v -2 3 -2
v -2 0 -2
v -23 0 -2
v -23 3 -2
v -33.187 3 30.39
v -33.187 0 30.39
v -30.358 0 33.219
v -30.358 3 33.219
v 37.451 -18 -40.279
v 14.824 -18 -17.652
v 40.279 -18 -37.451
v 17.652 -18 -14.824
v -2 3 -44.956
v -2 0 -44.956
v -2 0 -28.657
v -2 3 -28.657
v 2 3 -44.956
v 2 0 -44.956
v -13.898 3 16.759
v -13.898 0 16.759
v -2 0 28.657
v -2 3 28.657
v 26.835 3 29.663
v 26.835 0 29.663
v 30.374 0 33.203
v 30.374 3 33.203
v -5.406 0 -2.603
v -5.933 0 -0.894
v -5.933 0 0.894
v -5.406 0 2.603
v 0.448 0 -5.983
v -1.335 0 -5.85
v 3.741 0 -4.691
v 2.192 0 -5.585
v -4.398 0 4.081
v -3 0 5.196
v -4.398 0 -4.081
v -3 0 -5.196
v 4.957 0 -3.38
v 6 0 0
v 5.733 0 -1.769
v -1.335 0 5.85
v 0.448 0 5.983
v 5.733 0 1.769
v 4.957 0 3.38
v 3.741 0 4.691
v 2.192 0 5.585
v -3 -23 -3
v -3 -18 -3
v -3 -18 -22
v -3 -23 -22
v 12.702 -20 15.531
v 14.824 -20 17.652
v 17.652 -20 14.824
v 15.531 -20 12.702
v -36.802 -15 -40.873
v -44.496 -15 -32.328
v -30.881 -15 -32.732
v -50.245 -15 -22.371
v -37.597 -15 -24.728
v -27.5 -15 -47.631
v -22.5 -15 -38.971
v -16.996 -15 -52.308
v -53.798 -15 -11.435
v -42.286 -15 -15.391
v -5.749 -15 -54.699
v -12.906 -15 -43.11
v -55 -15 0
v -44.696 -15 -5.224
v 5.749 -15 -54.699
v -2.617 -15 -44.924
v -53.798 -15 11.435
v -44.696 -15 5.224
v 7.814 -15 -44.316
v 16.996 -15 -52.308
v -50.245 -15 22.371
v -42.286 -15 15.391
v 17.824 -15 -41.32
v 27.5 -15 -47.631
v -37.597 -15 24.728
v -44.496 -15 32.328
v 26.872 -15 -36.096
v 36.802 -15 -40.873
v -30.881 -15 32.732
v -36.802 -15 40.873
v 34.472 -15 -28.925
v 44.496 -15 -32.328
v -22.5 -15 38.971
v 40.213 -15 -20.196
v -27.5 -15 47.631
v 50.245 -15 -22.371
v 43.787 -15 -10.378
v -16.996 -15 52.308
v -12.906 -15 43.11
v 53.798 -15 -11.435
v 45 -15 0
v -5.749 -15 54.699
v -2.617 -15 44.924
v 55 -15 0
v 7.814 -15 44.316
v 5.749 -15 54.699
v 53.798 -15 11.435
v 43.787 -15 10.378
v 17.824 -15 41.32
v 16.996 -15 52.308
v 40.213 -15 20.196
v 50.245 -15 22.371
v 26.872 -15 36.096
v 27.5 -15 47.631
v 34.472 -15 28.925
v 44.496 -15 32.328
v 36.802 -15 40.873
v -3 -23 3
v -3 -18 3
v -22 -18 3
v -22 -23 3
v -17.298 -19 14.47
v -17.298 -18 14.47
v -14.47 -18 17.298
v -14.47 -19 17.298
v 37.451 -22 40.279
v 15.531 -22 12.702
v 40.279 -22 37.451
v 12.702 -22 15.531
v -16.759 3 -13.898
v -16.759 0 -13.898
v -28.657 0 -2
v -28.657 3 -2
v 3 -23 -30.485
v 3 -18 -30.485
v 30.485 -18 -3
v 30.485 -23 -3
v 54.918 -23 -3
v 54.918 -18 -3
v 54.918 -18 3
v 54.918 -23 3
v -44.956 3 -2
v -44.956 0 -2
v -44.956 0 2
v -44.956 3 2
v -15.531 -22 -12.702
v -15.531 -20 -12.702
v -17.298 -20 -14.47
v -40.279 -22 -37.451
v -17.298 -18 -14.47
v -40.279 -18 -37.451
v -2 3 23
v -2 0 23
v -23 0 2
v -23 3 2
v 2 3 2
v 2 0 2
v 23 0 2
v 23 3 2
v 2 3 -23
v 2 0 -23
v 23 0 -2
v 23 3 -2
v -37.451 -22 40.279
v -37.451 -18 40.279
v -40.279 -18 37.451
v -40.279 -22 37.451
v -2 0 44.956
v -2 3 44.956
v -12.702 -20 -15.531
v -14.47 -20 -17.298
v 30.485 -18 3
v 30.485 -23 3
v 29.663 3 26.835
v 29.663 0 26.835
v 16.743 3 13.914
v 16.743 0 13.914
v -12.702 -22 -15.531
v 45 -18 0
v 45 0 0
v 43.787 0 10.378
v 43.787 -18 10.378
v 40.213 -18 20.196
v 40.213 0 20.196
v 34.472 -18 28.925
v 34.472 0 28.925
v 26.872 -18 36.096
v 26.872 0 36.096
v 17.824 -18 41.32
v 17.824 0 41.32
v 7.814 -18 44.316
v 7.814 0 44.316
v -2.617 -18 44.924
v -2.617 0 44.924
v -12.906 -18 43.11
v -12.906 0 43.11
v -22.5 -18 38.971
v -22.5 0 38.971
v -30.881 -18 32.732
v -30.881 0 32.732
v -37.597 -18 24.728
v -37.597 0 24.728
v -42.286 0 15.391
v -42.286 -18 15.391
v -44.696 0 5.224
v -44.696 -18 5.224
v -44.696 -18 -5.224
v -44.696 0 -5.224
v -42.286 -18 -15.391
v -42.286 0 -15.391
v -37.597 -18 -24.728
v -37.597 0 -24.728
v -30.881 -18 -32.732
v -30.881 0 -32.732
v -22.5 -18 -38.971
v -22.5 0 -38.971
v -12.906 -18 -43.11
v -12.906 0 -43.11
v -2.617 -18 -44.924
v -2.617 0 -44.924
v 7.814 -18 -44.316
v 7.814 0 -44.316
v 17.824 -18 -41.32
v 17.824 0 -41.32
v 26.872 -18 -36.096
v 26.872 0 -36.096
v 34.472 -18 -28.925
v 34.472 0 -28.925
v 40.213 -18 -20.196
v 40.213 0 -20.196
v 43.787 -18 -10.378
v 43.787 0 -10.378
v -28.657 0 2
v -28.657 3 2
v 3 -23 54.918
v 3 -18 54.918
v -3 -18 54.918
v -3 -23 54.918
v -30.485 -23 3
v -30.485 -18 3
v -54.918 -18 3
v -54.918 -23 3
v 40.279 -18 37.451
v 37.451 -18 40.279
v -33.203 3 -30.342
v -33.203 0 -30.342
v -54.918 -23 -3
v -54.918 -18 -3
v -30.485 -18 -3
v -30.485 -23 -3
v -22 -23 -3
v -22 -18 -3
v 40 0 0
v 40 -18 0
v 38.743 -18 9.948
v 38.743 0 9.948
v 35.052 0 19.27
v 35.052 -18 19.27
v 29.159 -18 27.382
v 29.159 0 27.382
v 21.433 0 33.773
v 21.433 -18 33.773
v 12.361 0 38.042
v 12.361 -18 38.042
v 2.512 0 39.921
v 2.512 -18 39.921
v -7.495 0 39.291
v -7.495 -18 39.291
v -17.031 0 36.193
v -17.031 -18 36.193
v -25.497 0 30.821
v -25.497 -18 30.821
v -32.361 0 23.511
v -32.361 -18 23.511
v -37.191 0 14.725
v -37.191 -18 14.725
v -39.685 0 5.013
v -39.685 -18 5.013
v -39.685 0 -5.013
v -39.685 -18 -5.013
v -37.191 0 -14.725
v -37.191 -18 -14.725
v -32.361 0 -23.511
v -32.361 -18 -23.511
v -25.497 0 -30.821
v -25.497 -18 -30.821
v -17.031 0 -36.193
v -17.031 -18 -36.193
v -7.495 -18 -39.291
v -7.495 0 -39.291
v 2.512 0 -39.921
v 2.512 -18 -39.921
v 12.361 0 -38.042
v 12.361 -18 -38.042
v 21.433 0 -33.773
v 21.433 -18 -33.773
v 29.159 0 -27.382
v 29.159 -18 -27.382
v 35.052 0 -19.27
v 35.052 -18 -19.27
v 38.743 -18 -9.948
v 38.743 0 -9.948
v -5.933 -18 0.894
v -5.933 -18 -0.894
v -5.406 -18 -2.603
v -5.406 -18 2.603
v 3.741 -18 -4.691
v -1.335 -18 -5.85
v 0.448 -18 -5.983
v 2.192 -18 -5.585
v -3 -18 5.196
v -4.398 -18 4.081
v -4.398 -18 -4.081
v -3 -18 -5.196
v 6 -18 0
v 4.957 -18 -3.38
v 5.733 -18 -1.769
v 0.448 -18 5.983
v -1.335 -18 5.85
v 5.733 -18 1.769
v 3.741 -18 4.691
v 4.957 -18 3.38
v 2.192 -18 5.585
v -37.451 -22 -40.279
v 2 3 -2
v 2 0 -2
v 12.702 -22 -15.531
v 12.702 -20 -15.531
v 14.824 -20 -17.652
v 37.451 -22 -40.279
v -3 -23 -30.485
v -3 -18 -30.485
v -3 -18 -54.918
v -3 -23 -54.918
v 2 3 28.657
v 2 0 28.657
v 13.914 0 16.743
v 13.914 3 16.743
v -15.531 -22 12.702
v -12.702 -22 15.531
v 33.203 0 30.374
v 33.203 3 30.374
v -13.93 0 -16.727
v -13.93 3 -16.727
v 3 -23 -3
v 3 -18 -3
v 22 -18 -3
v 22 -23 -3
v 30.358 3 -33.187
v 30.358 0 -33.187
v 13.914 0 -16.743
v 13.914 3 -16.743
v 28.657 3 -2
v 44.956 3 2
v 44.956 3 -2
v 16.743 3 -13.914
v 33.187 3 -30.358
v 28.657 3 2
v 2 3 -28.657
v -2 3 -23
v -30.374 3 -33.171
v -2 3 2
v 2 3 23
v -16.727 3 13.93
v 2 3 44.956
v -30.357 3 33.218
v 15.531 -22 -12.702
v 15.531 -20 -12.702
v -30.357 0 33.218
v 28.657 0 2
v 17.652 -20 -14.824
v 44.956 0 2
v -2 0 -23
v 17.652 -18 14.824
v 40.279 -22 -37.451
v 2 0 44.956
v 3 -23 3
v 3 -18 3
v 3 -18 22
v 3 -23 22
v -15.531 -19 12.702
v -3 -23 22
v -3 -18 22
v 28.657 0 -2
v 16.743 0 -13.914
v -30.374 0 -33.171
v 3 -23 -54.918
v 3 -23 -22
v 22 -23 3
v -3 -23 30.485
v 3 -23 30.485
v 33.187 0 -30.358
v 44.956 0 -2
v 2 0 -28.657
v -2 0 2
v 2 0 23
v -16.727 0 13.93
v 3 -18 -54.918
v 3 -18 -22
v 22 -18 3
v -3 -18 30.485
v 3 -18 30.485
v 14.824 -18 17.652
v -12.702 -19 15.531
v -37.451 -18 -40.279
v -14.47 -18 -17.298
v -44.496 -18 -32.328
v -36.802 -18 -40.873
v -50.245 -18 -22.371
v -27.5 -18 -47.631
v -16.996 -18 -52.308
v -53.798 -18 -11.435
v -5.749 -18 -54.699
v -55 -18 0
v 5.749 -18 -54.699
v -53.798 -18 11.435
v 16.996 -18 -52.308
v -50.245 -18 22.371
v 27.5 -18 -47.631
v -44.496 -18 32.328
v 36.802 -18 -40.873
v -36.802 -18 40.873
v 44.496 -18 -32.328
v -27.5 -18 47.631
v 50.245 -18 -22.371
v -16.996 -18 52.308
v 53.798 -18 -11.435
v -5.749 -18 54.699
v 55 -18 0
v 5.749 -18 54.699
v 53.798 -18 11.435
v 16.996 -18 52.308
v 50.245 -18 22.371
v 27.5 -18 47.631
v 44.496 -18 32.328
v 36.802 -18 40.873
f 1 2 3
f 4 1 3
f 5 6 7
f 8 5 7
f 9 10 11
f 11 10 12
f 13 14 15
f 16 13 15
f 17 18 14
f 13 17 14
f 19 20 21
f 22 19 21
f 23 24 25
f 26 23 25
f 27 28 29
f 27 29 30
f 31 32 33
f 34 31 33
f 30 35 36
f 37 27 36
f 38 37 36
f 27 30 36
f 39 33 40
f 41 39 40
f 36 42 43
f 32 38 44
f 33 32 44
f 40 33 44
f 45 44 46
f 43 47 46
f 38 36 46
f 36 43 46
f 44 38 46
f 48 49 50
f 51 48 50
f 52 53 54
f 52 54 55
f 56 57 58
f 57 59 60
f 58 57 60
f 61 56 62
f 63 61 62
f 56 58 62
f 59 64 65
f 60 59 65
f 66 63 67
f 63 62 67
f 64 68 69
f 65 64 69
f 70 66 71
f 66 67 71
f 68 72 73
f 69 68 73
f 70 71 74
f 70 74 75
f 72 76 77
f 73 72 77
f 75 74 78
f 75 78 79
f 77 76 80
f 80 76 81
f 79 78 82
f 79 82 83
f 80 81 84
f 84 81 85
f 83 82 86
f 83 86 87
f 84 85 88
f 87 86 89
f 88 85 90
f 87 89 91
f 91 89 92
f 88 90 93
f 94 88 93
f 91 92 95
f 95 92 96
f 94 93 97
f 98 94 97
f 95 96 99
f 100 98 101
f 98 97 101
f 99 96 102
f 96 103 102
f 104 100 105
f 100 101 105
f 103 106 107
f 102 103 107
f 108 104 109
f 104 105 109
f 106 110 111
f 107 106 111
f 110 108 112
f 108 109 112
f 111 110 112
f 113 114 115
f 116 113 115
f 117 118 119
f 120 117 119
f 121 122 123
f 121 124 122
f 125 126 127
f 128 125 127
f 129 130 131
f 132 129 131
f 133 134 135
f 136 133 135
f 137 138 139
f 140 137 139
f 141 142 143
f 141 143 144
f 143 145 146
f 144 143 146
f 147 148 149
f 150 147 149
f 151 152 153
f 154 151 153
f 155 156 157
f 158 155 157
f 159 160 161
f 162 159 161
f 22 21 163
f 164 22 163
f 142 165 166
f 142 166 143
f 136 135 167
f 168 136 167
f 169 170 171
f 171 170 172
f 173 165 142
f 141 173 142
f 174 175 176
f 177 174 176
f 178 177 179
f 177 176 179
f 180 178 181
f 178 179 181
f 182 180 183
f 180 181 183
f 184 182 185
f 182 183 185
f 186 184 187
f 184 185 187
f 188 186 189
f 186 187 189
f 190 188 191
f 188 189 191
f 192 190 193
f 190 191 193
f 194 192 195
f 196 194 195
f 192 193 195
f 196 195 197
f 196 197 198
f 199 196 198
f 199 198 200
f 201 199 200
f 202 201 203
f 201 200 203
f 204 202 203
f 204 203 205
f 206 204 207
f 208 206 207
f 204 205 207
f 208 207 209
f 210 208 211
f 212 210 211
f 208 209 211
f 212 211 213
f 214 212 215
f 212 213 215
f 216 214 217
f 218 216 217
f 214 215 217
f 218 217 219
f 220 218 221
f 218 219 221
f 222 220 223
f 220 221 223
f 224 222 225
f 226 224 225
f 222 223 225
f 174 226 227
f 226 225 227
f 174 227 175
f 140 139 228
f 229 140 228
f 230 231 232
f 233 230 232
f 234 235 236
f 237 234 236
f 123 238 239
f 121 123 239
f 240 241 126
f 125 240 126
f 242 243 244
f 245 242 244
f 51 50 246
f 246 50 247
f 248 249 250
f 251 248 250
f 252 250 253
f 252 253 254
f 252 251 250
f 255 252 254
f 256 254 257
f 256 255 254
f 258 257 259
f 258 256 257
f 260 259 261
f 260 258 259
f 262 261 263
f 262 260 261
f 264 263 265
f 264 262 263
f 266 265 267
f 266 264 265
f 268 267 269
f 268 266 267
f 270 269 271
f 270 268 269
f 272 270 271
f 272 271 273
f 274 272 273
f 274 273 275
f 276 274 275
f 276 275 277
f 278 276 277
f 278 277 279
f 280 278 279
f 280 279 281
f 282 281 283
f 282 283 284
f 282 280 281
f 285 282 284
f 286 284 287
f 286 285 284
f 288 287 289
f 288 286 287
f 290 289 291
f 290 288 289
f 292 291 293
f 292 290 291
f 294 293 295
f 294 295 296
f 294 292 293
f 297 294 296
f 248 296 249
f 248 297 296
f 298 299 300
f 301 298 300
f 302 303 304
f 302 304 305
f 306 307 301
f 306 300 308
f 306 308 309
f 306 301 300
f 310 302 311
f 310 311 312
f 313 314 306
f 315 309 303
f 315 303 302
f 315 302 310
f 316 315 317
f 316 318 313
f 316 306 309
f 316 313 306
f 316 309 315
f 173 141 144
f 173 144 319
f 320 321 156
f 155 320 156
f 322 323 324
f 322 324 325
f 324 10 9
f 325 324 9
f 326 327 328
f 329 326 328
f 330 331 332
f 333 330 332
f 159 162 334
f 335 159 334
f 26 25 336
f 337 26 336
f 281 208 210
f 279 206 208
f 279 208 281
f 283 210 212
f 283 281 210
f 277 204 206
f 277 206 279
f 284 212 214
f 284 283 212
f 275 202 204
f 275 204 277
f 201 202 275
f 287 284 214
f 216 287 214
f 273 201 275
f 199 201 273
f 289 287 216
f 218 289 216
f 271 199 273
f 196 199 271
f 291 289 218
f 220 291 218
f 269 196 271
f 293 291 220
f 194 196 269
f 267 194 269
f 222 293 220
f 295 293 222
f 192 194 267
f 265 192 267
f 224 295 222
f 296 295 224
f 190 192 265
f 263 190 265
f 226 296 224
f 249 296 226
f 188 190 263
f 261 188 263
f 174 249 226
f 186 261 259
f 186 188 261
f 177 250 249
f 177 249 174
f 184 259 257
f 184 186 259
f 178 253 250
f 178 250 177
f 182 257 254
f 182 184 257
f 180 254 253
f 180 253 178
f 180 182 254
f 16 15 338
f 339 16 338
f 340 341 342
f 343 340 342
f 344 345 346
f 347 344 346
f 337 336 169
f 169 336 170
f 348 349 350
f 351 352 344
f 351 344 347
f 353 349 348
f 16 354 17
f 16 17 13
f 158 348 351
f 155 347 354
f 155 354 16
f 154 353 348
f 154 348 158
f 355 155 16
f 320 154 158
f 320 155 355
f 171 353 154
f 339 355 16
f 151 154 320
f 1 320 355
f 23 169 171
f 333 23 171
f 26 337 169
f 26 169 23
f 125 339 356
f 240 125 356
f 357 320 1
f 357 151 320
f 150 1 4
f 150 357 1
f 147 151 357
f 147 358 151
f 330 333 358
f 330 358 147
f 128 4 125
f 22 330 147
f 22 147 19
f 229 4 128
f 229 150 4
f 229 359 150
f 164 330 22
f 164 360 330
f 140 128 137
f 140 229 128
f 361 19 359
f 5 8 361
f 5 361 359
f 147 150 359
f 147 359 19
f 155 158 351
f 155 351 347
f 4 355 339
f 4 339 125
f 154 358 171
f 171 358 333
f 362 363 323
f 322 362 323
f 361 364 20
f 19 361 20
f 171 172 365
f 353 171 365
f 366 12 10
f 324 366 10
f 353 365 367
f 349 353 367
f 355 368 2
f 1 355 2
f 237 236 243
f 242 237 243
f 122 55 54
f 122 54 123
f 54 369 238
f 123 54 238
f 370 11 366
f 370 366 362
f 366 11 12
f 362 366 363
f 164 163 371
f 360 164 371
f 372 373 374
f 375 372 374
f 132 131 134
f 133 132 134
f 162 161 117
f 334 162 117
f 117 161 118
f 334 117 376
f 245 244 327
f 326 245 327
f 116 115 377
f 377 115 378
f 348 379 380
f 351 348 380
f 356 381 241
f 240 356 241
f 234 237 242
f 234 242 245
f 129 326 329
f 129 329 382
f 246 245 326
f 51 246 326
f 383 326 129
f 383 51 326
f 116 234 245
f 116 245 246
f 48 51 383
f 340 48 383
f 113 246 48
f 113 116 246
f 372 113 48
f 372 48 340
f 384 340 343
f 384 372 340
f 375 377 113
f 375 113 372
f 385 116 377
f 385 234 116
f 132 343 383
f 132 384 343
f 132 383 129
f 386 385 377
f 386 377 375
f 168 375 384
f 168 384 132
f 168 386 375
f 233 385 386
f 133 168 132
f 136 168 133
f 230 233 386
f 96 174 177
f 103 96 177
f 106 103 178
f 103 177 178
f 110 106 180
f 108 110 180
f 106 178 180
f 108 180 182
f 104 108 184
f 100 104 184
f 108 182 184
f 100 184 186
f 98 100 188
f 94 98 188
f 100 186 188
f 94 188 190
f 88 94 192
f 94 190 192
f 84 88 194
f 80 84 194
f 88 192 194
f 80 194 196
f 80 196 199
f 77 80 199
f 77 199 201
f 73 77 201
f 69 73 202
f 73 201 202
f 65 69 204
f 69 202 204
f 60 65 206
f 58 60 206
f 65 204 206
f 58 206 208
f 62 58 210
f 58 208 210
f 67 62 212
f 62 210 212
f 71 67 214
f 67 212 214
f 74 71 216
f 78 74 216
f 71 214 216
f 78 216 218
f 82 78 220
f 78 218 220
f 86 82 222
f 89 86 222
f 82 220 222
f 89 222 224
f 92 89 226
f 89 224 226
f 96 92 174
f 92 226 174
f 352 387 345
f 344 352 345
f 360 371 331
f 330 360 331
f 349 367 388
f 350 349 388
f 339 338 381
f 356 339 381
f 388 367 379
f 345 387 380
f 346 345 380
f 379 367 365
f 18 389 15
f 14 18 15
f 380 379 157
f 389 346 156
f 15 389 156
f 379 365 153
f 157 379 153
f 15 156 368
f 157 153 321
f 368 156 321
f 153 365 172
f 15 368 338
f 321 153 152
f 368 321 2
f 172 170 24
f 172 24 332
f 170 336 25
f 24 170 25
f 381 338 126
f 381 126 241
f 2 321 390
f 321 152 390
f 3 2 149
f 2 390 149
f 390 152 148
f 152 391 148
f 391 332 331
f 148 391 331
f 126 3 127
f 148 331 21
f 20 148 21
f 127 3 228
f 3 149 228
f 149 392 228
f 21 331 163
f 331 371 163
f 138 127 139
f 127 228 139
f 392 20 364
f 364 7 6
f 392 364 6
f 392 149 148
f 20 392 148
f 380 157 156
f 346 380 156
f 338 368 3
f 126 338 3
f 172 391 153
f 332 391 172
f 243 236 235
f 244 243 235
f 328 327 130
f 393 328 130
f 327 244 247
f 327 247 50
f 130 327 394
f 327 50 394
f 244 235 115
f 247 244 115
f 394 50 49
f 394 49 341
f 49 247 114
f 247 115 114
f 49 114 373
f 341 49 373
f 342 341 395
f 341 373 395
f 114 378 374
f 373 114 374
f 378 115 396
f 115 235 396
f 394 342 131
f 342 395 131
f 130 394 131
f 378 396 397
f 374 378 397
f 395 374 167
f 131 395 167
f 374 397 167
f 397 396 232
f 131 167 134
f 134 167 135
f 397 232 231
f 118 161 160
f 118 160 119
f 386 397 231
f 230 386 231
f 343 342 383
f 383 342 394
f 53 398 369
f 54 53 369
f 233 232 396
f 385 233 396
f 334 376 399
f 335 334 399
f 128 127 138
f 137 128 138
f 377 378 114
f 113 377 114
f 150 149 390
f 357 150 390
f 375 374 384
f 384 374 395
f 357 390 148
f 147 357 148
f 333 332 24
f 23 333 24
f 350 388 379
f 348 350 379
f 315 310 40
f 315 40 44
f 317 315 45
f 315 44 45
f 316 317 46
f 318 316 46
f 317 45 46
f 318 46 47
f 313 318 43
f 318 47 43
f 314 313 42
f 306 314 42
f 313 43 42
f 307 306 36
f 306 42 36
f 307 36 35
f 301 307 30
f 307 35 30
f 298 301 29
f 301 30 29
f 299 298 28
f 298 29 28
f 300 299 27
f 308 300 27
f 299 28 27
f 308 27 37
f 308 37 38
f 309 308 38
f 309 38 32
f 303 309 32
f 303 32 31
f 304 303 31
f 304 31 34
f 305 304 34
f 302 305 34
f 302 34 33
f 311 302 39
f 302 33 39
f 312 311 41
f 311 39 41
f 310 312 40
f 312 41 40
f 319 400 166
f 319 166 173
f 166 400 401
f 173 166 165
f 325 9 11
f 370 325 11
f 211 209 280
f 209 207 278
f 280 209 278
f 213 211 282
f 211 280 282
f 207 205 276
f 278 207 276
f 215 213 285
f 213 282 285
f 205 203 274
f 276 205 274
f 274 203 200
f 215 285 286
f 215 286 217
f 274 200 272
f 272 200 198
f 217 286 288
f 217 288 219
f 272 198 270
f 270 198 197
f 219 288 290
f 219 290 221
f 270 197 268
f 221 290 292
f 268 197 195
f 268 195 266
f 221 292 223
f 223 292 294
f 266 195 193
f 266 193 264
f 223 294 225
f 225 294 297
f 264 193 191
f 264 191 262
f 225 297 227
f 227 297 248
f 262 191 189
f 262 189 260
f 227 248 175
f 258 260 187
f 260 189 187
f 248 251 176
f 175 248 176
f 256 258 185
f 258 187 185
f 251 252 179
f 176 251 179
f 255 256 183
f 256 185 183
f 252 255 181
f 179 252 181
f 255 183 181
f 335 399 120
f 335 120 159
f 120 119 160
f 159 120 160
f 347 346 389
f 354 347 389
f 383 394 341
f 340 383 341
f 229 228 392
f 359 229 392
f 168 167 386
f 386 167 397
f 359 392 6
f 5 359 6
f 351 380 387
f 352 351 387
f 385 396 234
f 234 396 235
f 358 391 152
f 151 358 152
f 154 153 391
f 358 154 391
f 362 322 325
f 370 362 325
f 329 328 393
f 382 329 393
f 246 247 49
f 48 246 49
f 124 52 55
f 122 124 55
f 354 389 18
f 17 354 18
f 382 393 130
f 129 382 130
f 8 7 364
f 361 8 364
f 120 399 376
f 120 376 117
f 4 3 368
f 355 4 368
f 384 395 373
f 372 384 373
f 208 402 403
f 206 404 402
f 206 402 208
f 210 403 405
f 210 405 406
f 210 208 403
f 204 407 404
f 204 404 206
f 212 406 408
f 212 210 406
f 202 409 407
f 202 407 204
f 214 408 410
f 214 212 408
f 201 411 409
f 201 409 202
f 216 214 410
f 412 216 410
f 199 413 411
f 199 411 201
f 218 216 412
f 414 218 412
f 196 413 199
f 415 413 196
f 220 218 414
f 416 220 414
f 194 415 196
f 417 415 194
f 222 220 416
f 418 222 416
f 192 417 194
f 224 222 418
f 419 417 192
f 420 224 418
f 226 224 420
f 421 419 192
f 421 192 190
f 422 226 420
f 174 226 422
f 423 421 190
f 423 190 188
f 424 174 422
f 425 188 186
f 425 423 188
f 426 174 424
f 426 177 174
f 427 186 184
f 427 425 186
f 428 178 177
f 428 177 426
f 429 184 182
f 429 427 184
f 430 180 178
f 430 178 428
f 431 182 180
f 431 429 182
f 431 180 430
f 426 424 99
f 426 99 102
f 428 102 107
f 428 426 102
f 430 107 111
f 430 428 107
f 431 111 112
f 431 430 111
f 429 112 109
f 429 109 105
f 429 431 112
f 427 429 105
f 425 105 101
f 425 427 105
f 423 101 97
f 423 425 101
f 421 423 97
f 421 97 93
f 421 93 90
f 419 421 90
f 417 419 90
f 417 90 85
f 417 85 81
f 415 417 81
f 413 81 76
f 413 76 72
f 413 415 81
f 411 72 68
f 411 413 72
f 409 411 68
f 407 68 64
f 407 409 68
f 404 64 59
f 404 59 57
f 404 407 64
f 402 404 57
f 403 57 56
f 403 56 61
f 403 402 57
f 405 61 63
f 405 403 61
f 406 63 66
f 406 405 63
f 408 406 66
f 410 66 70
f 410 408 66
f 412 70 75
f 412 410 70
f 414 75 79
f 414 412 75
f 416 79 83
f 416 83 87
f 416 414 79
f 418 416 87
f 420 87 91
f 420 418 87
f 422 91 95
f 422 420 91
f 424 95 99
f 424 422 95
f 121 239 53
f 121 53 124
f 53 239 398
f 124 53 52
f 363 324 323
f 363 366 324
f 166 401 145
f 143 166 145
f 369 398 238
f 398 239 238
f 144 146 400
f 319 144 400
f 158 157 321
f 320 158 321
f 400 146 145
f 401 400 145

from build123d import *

# Parameters (mm, degrees)
F0_R      = 6
F1_DEPTH  = 18
F0_R_2    = 45
F0_R_3    = 40
F2_R      = 55
F2_R_2    = 45
F3_DEPTH  = 3
F4_W      = 6
F4_H      = 6
F5_DEPTH  = 5
F7_DEPTH  = 4
F9_DEPTH  = 1
F11_DEPTH = 2
F13_DEPTH = 2
F15_DEPTH = 2
F16_W     = 4
F16_H     = 4
F17_DEPTH = 3


with BuildPart() as f1:
    # F0 (on Front) → F1 (new body)
    with BuildSketch(Plane.XZ):
        Circle(F0_R)
    extrude(amount=F1_DEPTH)


with BuildPart() as f1b:
    # F0 (on Front) → F1, piece 2 (new body)
    with BuildSketch(Plane.XZ):
        Circle(F0_R_2)
        Circle(F0_R_3, mode=Mode.SUBTRACT)
    extrude(amount=F1_DEPTH)


with BuildPart() as f3:
    # F2 (on face) → F3 (new body)
    with BuildSketch(Plane.XZ.offset(18)):
        Circle(F2_R)
        Circle(F2_R_2, mode=Mode.SUBTRACT)
    extrude(amount=-F3_DEPTH)


with BuildPart() as f5:
    # F4 (on face) → F5 (new body)
    with BuildSketch(Plane.XZ.offset(18)):
        Rectangle(F4_W, F4_H)
        with BuildLine():
            Line((-54.918120871, 3), (-54.918120871, -3))
            Line((-54.918120871, -3), (-44.8998886413, -3))
            ThreePointArc((-44.8998886413, -3), (-45, 0), (-44.8998886413, 3))
            Line((-44.8998886413, 3), (-54.918120871, 3))
        make_face()
        Polygon((-25, 0), (-22, -3), (-3, -3), (-3, 3), (-22, 3), align=None)
        Polygon((3, -3), (-3, -3), (-3, -22), (0, -25), (3, -22), align=None)
        Polygon((3, 3), (3, -3), (22, -3), (25, 0), (22, 3), align=None)
        with BuildLine():
            Line((44.8998886413, -3), (54.918120871, -3))
            Line((54.918120871, -3), (54.918120871, 3))
            Line((54.918120871, 3), (44.8998886413, 3))
            ThreePointArc((44.8998886413, 3), (44.9749651965, 1.500834958), (45, 0))
            ThreePointArc((45, 0), (44.9749651965, -1.500834958), (44.8998886413, -3))
        make_face()
        with BuildLine():
            Line((3, 54.918120871), (-3, 54.918120871))
            Line((-3, 54.918120871), (-3, 44.8998886413))
            ThreePointArc((-3, 44.8998886413), (0, 45), (3, 44.8998886413))
            Line((3, 44.8998886413), (3, 54.918120871))
        make_face()
        with BuildLine():
            Line((-3, -44.8998886413), (-3, -54.918120871))
            Line((-3, -54.918120871), (3, -54.918120871))
            Line((3, -54.918120871), (3, -44.8998886413))
            ThreePointArc((3, -44.8998886413), (0, -45), (-3, -44.8998886413))
        make_face()
        Polygon((-3, 22), (-3, 3), (3, 3), (3, 22), (0, 25), align=None)
        with BuildLine():
            ThreePointArc((-44.8998886413, 3), (-45, 0), (-44.8998886413, -3))
            Line((-44.8998886413, -3), (-30.4852813742, -3))
            Line((-30.4852813742, -3), (-33.4852813742, 0))
            Line((-33.4852813742, 0), (-30.4852813742, 3))
            Line((-30.4852813742, 3), (-44.8998886413, 3))
        make_face()
        Polygon((-33.4852813742, 0), (-30.4852813742, -3), (-22, -3), (-25, 0), (-22, 3), (-30.4852813742, 3), align=None)
        Polygon((-3, 30.4852813742), (-30.4852813742, 3), (-22, 3), (-3, 22), align=None)
        Polygon((-22, -3), (-30.4852813742, -3), (-3, -30.4852813742), (-3, -22), align=None)
        Polygon((3, -22), (3, -30.4852813742), (30.4852813742, -3), (22, -3), align=None)
        Polygon((-3, -22), (-3, -30.4852813742), (0, -33.4852813742), (3, -30.4852813742), (3, -22), (0, -25), align=None)
        with BuildLine():
            Line((-3, -30.4852813742), (-3, -44.8998886413))
            ThreePointArc((-3, -44.8998886413), (0, -45), (3, -44.8998886413))
            Line((3, -44.8998886413), (3, -30.4852813742))
            Line((3, -30.4852813742), (0, -33.4852813742))
            Line((0, -33.4852813742), (-3, -30.4852813742))
        make_face()
        Polygon((30.4852813742, 3), (3, 30.4852813742), (3, 22), (22, 3), align=None)
        Polygon((22, -3), (30.4852813742, -3), (33.4852813742, 0), (30.4852813742, 3), (22, 3), (25, 0), align=None)
        Polygon((0, 33.4852813742), (-3, 30.4852813742), (-3, 22), (0, 25), (3, 22), (3, 30.4852813742), align=None)
        with BuildLine():
            ThreePointArc((3, 44.8998886413), (0, 45), (-3, 44.8998886413))
            Line((-3, 44.8998886413), (-3, 30.4852813742))
            Line((-3, 30.4852813742), (0, 33.4852813742))
            Line((0, 33.4852813742), (3, 30.4852813742))
            Line((3, 30.4852813742), (3, 44.8998886413))
        make_face()
        with BuildLine():
            Line((30.4852813742, -3), (44.8998886413, -3))
            ThreePointArc((44.8998886413, -3), (44.9749651965, -1.500834958), (45, 0))
            ThreePointArc((45, 0), (44.9749651965, 1.500834958), (44.8998886413, 3))
            Line((44.8998886413, 3), (30.4852813742, 3))
            Line((30.4852813742, 3), (33.4852813742, 0))
            Line((33.4852813742, 0), (30.4852813742, -3))
        make_face()
    extrude(amount=F5_DEPTH)


with BuildPart() as f7:
    # F6 (on face) → F7 (new body)
    with BuildSketch(Plane.XZ.offset(18)):
        Polygon((-40.279365048, 37.4509379232), (-15.5306277065, 12.7022005817), (-12.7022005817, 15.5306277065), (-37.4509379232, 40.279365048), align=None)
    extrude(amount=F7_DEPTH)

    # F8 (on face) → F9 (cut)
    with BuildSketch(Plane(origin=(0, -18, 0), x_dir=(-1, 0, 0), z_dir=(0, 1, 0))):
        Polygon((17.2983946594, 14.4699675347), (14.4699675347, 17.2983946594), (12.7022005817, 15.5306277065), (15.5306277065, 12.7022005817), align=None)
    extrude(amount=-F9_DEPTH, mode=Mode.SUBTRACT)


with BuildPart() as f7b:
    # F6 (on face) → F7, piece 2 (new body)
    with BuildSketch(Plane.XZ.offset(18)):
        Polygon((-15.5306277065, -12.7022005817), (-40.279365048, -37.4509379232), (-37.4509379232, -40.279365048), (-12.7022005817, -15.5306277065), align=None)
    extrude(amount=F7_DEPTH)

    # F10 (on face) → F11 (cut)
    with BuildSketch(Plane(origin=(0, -18, 0), x_dir=(-1, 0, 0), z_dir=(0, 1, 0))):
        Polygon((17.2983946594, -14.4699675347), (15.5306277065, -12.7022005817), (12.7022005817, -15.5306277065), (14.4699675347, -17.2983946594), align=None)
    extrude(amount=-F11_DEPTH, mode=Mode.SUBTRACT)


with BuildPart() as f7c:
    # F6 (on face) → F7, piece 3 (new body)
    with BuildSketch(Plane.XZ.offset(18)):
        Polygon((12.7022005817, -15.5306277065), (37.4509379232, -40.279365048), (40.279365048, -37.4509379232), (15.5306277065, -12.7022005817), align=None)
    extrude(amount=F7_DEPTH)

    # F12 (on face) → F13 (cut)
    with BuildSketch(Plane(origin=(0, -18, 0), x_dir=(-1, 0, 0), z_dir=(0, 1, 0))):
        Polygon((-14.8235209253, -17.65194805), (-12.7022005817, -15.5306277065), (-15.5306277065, -12.7022005817), (-17.65194805, -14.8235209253), align=None)
    extrude(amount=-F13_DEPTH, mode=Mode.SUBTRACT)


with BuildPart() as f7d:
    # F6 (on face) → F7, piece 4 (new body)
    with BuildSketch(Plane.XZ.offset(18)):
        Polygon((15.5306277065, 12.7022005817), (40.279365048, 37.4509379232), (37.4509379232, 40.279365048), (12.7022005817, 15.5306277065), align=None)
    extrude(amount=F7_DEPTH)

    # F14 (on face) → F15 (cut)
    with BuildSketch(Plane(origin=(0, -18, 0), x_dir=(-1, 0, 0), z_dir=(0, 1, 0))):
        Polygon((-15.5306277065, 12.7022005817), (-12.7022005817, 15.5306277065), (-14.8235209253, 17.65194805), (-17.65194805, 14.8235209253), align=None)
    extrude(amount=-F15_DEPTH, mode=Mode.SUBTRACT)


with BuildPart() as f17:
    # F16 (on face) → F17 (new body)
    with BuildSketch(Plane(origin=(0, 0, 0), x_dir=(-1, 0, 0), z_dir=(0, 1, 0))):
        with BuildLine():
            Line((-44.955533586, 2), (-44.955533586, -2))
            Line((-44.955533586, -2), (-39.9499687109, -2))
            ThreePointArc((-39.9499687109, -2), (-40, 0), (-39.9499687109, 2))
            Line((-39.9499687109, 2), (-44.955533586, 2))
        make_face()
        with BuildLine():
            ThreePointArc((-39.9499687109, 2), (-40, 0), (-39.9499687109, -2))
            Line((-39.9499687109, -2), (-28.6568542495, -2))
            Line((-28.6568542495, -2), (-30.6568542495, 0))
            Line((-30.6568542495, 0), (-28.6568542495, 2))
            Line((-28.6568542495, 2), (-39.9499687109, 2))
        make_face()
        with BuildLine():
            Line((-2, -39.9499687109), (-2, -44.955533586))
            Line((-2, -44.955533586), (2, -44.955533586))
            Line((2, -44.955533586), (2, -39.9499687109))
            ThreePointArc((2, -39.9499687109), (0, -40), (-2, -39.9499687109))
        make_face()
        Polygon((-30.6568542495, 0), (-28.6568542495, -2), (-23, -2), (-25, 0), (-23, 2), (-28.6568542495, 2), align=None)
        Polygon((-23, -2), (-28.6568542495, -2), (-16.7426406871, -13.9142135624), (-13.9142135624, -16.7426406871), (-2, -28.6568542495), (-2, -23), align=None)
        with BuildLine():
            ThreePointArc((-26.8346802213, -29.663107346), (-28.2842712475, -28.2842712475), (-29.663107346, -26.8346802213))
            Line((-29.663107346, -26.8346802213), (-33.1865494443, -30.3581223196))
            Line((-33.1865494443, -30.3581223196), (-30.3581223196, -33.1865494443))
            Line((-30.3581223196, -33.1865494443), (-26.8346802213, -29.663107346))
        make_face()
        with BuildLine():
            Line((-16.7426406871, -13.9142135624), (-29.663107346, -26.8346802213))
            ThreePointArc((-29.663107346, -26.8346802213), (-28.2842712475, -28.2842712475), (-26.8346802213, -29.663107346))
            Line((-26.8346802213, -29.663107346), (-13.9142135624, -16.7426406871))
            Line((-13.9142135624, -16.7426406871), (-16.7426406871, -13.9142135624))
        make_face()
        with BuildLine():
            Line((-30.3741490881, 33.2025762129), (-33.2025762129, 30.3741490881))
            Line((-33.2025762129, 30.3741490881), (-29.663107346, 26.8346802213))
            ThreePointArc((-29.663107346, 26.8346802213), (-28.2842712475, 28.2842712475), (-26.8346802213, 29.663107346))
            Line((-26.8346802213, 29.663107346), (-30.3741490881, 33.2025762129))
        make_face()
        with BuildLine():
            Line((-2, -28.6568542495), (-2, -39.9499687109))
            ThreePointArc((-2, -39.9499687109), (0, -40), (2, -39.9499687109))
            Line((2, -39.9499687109), (2, -28.6568542495))
            Line((2, -28.6568542495), (0, -30.6568542495))
            Line((0, -30.6568542495), (-2, -28.6568542495))
        make_face()
        Polygon((-25, 0), (-23, -2), (-2, -2), (-2, 2), (-23, 2), align=None)
        Polygon((-16.7426406871, 13.9142135624), (-28.6568542495, 2), (-23, 2), (-2, 23), (-2, 28.6568542495), (-13.9142135624, 16.7426406871), align=None)
        with BuildLine():
            ThreePointArc((-26.8346802213, 29.663107346), (-28.2842712475, 28.2842712475), (-29.663107346, 26.8346802213))
            Line((-29.663107346, 26.8346802213), (-16.7426406871, 13.9142135624))
            Line((-16.7426406871, 13.9142135624), (-13.9142135624, 16.7426406871))
            Line((-13.9142135624, 16.7426406871), (-26.8346802213, 29.663107346))
        make_face()
        with BuildLine():
            Line((39.9499687109, -2), (44.955533586, -2))
            Line((44.955533586, -2), (44.955533586, 2))
            Line((44.955533586, 2), (39.9499687109, 2))
            ThreePointArc((39.9499687109, 2), (39.9874902215, 1.0003128423), (40, 0))
            ThreePointArc((40, 0), (39.9874902215, -1.0003128423), (39.9499687109, -2))
        make_face()
        Polygon((-2, -23), (-2, -28.6568542495), (0, -30.6568542495), (2, -28.6568542495), (2, -23), (0, -25), align=None)
        Rectangle(F16_W, F16_H)
        Polygon((2, -2), (-2, -2), (-2, -23), (0, -25), (2, -23), align=None)
        with BuildLine():
            Line((2, 44.955533586), (-2, 44.955533586))
            Line((-2, 44.955533586), (-2, 39.9499687109))
            ThreePointArc((-2, 39.9499687109), (0, 40), (2, 39.9499687109))
            Line((2, 39.9499687109), (2, 44.955533586))
        make_face()
        Polygon((2, -23), (2, -28.6568542495), (13.9302403309, -16.7266139185), (16.7586674557, -13.8981867938), (28.6568542495, -2), (23, -2), align=None)
        with BuildLine():
            ThreePointArc((29.6783272148, -26.8178465529), (28.3003135351, -28.2682198558), (26.8515047742, -29.6478783618))
            Line((26.8515047742, -29.6478783618), (30.3741490881, -33.1705226757))
            Line((30.3741490881, -33.1705226757), (33.2025762129, -30.342095551))
            Line((33.2025762129, -30.342095551), (29.6783272148, -26.8178465529))
        make_face()
        with BuildLine():
            Line((13.9302403309, -16.7266139185), (26.8515047742, -29.6478783618))
            ThreePointArc((26.8515047742, -29.6478783618), (28.3003135351, -28.2682198558), (29.6783272148, -26.8178465529))
            Line((29.6783272148, -26.8178465529), (16.7586674557, -13.8981867938))
            Line((16.7586674557, -13.8981867938), (13.9302403309, -16.7266139185))
        make_face()
        with BuildLine():
            Line((28.6568542495, -2), (39.9499687109, -2))
            ThreePointArc((39.9499687109, -2), (39.9874902215, -1.0003128423), (40, 0))
            ThreePointArc((40, 0), (39.9874902215, 1.0003128423), (39.9499687109, 2))
            Line((39.9499687109, 2), (28.6568542495, 2))
            Line((28.6568542495, 2), (30.6568542495, 0))
            Line((30.6568542495, 0), (28.6568542495, -2))
        make_face()
        Polygon((2, 2), (2, -2), (23, -2), (25, 0), (23, 2), align=None)
        Polygon((-2, 23), (-2, 2), (2, 2), (2, 23), (0, 25), align=None)
        Polygon((-2, 28.6568542495), (-2, 23), (0, 25), (2, 23), (2, 28.6568542495), (0, 30.6568542495), align=None)
        with BuildLine():
            ThreePointArc((2, 39.9499687109), (0, 40), (-2, 39.9499687109))
            Line((-2, 39.9499687109), (-2, 28.6568542495))
            Line((-2, 28.6568542495), (0, 30.6568542495))
            Line((0, 30.6568542495), (2, 28.6568542495))
            Line((2, 28.6568542495), (2, 39.9499687109))
        make_face()
        Polygon((23, -2), (28.6568542495, -2), (30.6568542495, 0), (28.6568542495, 2), (23, 2), (25, 0), align=None)
        with BuildLine():
            ThreePointArc((30.357405266, 33.2178859279), (30.3657781419, 33.2102321256), (30.3741490881, 33.2025762129))
            Line((30.3741490881, 33.2025762129), (30.3581223196, 33.2186029814))
            Line((30.3581223196, 33.2186029814), (30.357405266, 33.2178859279))
        make_face()
        with BuildLine():
            Line((33.1865494443, 30.3901758567), (30.3741490881, 33.2025762129))
            ThreePointArc((30.3741490881, 33.2025762129), (30.3657781419, 33.2102321256), (30.357405266, 33.2178859279))
            Line((30.357405266, 33.2178859279), (26.8178465529, 29.6783272148))
            ThreePointArc((26.8178465529, 29.6783272148), (28.2682198558, 28.3003135351), (29.6478783618, 26.8515047742))
            Line((29.6478783618, 26.8515047742), (33.1865494443, 30.3901758567))
        make_face()
        Polygon((23, 2), (28.6568542495, 2), (16.7266139185, 13.9302403309), (13.8981867938, 16.7586674557), (2, 28.6568542495), (2, 23), align=None)
        with BuildLine():
            Line((16.7266139185, 13.9302403309), (29.6478783618, 26.8515047742))
            ThreePointArc((29.6478783618, 26.8515047742), (28.2682198558, 28.3003135351), (26.8178465529, 29.6783272148))
            Line((26.8178465529, 29.6783272148), (13.8981867938, 16.7586674557))
            Line((13.8981867938, 16.7586674557), (16.7266139185, 13.9302403309))
        make_face()
    extrude(amount=F17_DEPTH)


solid = Compound([f1.part, f1b.part, f3.part, f5.part, f7.part, f7b.part, f7c.part, f7d.part, f17.part])
